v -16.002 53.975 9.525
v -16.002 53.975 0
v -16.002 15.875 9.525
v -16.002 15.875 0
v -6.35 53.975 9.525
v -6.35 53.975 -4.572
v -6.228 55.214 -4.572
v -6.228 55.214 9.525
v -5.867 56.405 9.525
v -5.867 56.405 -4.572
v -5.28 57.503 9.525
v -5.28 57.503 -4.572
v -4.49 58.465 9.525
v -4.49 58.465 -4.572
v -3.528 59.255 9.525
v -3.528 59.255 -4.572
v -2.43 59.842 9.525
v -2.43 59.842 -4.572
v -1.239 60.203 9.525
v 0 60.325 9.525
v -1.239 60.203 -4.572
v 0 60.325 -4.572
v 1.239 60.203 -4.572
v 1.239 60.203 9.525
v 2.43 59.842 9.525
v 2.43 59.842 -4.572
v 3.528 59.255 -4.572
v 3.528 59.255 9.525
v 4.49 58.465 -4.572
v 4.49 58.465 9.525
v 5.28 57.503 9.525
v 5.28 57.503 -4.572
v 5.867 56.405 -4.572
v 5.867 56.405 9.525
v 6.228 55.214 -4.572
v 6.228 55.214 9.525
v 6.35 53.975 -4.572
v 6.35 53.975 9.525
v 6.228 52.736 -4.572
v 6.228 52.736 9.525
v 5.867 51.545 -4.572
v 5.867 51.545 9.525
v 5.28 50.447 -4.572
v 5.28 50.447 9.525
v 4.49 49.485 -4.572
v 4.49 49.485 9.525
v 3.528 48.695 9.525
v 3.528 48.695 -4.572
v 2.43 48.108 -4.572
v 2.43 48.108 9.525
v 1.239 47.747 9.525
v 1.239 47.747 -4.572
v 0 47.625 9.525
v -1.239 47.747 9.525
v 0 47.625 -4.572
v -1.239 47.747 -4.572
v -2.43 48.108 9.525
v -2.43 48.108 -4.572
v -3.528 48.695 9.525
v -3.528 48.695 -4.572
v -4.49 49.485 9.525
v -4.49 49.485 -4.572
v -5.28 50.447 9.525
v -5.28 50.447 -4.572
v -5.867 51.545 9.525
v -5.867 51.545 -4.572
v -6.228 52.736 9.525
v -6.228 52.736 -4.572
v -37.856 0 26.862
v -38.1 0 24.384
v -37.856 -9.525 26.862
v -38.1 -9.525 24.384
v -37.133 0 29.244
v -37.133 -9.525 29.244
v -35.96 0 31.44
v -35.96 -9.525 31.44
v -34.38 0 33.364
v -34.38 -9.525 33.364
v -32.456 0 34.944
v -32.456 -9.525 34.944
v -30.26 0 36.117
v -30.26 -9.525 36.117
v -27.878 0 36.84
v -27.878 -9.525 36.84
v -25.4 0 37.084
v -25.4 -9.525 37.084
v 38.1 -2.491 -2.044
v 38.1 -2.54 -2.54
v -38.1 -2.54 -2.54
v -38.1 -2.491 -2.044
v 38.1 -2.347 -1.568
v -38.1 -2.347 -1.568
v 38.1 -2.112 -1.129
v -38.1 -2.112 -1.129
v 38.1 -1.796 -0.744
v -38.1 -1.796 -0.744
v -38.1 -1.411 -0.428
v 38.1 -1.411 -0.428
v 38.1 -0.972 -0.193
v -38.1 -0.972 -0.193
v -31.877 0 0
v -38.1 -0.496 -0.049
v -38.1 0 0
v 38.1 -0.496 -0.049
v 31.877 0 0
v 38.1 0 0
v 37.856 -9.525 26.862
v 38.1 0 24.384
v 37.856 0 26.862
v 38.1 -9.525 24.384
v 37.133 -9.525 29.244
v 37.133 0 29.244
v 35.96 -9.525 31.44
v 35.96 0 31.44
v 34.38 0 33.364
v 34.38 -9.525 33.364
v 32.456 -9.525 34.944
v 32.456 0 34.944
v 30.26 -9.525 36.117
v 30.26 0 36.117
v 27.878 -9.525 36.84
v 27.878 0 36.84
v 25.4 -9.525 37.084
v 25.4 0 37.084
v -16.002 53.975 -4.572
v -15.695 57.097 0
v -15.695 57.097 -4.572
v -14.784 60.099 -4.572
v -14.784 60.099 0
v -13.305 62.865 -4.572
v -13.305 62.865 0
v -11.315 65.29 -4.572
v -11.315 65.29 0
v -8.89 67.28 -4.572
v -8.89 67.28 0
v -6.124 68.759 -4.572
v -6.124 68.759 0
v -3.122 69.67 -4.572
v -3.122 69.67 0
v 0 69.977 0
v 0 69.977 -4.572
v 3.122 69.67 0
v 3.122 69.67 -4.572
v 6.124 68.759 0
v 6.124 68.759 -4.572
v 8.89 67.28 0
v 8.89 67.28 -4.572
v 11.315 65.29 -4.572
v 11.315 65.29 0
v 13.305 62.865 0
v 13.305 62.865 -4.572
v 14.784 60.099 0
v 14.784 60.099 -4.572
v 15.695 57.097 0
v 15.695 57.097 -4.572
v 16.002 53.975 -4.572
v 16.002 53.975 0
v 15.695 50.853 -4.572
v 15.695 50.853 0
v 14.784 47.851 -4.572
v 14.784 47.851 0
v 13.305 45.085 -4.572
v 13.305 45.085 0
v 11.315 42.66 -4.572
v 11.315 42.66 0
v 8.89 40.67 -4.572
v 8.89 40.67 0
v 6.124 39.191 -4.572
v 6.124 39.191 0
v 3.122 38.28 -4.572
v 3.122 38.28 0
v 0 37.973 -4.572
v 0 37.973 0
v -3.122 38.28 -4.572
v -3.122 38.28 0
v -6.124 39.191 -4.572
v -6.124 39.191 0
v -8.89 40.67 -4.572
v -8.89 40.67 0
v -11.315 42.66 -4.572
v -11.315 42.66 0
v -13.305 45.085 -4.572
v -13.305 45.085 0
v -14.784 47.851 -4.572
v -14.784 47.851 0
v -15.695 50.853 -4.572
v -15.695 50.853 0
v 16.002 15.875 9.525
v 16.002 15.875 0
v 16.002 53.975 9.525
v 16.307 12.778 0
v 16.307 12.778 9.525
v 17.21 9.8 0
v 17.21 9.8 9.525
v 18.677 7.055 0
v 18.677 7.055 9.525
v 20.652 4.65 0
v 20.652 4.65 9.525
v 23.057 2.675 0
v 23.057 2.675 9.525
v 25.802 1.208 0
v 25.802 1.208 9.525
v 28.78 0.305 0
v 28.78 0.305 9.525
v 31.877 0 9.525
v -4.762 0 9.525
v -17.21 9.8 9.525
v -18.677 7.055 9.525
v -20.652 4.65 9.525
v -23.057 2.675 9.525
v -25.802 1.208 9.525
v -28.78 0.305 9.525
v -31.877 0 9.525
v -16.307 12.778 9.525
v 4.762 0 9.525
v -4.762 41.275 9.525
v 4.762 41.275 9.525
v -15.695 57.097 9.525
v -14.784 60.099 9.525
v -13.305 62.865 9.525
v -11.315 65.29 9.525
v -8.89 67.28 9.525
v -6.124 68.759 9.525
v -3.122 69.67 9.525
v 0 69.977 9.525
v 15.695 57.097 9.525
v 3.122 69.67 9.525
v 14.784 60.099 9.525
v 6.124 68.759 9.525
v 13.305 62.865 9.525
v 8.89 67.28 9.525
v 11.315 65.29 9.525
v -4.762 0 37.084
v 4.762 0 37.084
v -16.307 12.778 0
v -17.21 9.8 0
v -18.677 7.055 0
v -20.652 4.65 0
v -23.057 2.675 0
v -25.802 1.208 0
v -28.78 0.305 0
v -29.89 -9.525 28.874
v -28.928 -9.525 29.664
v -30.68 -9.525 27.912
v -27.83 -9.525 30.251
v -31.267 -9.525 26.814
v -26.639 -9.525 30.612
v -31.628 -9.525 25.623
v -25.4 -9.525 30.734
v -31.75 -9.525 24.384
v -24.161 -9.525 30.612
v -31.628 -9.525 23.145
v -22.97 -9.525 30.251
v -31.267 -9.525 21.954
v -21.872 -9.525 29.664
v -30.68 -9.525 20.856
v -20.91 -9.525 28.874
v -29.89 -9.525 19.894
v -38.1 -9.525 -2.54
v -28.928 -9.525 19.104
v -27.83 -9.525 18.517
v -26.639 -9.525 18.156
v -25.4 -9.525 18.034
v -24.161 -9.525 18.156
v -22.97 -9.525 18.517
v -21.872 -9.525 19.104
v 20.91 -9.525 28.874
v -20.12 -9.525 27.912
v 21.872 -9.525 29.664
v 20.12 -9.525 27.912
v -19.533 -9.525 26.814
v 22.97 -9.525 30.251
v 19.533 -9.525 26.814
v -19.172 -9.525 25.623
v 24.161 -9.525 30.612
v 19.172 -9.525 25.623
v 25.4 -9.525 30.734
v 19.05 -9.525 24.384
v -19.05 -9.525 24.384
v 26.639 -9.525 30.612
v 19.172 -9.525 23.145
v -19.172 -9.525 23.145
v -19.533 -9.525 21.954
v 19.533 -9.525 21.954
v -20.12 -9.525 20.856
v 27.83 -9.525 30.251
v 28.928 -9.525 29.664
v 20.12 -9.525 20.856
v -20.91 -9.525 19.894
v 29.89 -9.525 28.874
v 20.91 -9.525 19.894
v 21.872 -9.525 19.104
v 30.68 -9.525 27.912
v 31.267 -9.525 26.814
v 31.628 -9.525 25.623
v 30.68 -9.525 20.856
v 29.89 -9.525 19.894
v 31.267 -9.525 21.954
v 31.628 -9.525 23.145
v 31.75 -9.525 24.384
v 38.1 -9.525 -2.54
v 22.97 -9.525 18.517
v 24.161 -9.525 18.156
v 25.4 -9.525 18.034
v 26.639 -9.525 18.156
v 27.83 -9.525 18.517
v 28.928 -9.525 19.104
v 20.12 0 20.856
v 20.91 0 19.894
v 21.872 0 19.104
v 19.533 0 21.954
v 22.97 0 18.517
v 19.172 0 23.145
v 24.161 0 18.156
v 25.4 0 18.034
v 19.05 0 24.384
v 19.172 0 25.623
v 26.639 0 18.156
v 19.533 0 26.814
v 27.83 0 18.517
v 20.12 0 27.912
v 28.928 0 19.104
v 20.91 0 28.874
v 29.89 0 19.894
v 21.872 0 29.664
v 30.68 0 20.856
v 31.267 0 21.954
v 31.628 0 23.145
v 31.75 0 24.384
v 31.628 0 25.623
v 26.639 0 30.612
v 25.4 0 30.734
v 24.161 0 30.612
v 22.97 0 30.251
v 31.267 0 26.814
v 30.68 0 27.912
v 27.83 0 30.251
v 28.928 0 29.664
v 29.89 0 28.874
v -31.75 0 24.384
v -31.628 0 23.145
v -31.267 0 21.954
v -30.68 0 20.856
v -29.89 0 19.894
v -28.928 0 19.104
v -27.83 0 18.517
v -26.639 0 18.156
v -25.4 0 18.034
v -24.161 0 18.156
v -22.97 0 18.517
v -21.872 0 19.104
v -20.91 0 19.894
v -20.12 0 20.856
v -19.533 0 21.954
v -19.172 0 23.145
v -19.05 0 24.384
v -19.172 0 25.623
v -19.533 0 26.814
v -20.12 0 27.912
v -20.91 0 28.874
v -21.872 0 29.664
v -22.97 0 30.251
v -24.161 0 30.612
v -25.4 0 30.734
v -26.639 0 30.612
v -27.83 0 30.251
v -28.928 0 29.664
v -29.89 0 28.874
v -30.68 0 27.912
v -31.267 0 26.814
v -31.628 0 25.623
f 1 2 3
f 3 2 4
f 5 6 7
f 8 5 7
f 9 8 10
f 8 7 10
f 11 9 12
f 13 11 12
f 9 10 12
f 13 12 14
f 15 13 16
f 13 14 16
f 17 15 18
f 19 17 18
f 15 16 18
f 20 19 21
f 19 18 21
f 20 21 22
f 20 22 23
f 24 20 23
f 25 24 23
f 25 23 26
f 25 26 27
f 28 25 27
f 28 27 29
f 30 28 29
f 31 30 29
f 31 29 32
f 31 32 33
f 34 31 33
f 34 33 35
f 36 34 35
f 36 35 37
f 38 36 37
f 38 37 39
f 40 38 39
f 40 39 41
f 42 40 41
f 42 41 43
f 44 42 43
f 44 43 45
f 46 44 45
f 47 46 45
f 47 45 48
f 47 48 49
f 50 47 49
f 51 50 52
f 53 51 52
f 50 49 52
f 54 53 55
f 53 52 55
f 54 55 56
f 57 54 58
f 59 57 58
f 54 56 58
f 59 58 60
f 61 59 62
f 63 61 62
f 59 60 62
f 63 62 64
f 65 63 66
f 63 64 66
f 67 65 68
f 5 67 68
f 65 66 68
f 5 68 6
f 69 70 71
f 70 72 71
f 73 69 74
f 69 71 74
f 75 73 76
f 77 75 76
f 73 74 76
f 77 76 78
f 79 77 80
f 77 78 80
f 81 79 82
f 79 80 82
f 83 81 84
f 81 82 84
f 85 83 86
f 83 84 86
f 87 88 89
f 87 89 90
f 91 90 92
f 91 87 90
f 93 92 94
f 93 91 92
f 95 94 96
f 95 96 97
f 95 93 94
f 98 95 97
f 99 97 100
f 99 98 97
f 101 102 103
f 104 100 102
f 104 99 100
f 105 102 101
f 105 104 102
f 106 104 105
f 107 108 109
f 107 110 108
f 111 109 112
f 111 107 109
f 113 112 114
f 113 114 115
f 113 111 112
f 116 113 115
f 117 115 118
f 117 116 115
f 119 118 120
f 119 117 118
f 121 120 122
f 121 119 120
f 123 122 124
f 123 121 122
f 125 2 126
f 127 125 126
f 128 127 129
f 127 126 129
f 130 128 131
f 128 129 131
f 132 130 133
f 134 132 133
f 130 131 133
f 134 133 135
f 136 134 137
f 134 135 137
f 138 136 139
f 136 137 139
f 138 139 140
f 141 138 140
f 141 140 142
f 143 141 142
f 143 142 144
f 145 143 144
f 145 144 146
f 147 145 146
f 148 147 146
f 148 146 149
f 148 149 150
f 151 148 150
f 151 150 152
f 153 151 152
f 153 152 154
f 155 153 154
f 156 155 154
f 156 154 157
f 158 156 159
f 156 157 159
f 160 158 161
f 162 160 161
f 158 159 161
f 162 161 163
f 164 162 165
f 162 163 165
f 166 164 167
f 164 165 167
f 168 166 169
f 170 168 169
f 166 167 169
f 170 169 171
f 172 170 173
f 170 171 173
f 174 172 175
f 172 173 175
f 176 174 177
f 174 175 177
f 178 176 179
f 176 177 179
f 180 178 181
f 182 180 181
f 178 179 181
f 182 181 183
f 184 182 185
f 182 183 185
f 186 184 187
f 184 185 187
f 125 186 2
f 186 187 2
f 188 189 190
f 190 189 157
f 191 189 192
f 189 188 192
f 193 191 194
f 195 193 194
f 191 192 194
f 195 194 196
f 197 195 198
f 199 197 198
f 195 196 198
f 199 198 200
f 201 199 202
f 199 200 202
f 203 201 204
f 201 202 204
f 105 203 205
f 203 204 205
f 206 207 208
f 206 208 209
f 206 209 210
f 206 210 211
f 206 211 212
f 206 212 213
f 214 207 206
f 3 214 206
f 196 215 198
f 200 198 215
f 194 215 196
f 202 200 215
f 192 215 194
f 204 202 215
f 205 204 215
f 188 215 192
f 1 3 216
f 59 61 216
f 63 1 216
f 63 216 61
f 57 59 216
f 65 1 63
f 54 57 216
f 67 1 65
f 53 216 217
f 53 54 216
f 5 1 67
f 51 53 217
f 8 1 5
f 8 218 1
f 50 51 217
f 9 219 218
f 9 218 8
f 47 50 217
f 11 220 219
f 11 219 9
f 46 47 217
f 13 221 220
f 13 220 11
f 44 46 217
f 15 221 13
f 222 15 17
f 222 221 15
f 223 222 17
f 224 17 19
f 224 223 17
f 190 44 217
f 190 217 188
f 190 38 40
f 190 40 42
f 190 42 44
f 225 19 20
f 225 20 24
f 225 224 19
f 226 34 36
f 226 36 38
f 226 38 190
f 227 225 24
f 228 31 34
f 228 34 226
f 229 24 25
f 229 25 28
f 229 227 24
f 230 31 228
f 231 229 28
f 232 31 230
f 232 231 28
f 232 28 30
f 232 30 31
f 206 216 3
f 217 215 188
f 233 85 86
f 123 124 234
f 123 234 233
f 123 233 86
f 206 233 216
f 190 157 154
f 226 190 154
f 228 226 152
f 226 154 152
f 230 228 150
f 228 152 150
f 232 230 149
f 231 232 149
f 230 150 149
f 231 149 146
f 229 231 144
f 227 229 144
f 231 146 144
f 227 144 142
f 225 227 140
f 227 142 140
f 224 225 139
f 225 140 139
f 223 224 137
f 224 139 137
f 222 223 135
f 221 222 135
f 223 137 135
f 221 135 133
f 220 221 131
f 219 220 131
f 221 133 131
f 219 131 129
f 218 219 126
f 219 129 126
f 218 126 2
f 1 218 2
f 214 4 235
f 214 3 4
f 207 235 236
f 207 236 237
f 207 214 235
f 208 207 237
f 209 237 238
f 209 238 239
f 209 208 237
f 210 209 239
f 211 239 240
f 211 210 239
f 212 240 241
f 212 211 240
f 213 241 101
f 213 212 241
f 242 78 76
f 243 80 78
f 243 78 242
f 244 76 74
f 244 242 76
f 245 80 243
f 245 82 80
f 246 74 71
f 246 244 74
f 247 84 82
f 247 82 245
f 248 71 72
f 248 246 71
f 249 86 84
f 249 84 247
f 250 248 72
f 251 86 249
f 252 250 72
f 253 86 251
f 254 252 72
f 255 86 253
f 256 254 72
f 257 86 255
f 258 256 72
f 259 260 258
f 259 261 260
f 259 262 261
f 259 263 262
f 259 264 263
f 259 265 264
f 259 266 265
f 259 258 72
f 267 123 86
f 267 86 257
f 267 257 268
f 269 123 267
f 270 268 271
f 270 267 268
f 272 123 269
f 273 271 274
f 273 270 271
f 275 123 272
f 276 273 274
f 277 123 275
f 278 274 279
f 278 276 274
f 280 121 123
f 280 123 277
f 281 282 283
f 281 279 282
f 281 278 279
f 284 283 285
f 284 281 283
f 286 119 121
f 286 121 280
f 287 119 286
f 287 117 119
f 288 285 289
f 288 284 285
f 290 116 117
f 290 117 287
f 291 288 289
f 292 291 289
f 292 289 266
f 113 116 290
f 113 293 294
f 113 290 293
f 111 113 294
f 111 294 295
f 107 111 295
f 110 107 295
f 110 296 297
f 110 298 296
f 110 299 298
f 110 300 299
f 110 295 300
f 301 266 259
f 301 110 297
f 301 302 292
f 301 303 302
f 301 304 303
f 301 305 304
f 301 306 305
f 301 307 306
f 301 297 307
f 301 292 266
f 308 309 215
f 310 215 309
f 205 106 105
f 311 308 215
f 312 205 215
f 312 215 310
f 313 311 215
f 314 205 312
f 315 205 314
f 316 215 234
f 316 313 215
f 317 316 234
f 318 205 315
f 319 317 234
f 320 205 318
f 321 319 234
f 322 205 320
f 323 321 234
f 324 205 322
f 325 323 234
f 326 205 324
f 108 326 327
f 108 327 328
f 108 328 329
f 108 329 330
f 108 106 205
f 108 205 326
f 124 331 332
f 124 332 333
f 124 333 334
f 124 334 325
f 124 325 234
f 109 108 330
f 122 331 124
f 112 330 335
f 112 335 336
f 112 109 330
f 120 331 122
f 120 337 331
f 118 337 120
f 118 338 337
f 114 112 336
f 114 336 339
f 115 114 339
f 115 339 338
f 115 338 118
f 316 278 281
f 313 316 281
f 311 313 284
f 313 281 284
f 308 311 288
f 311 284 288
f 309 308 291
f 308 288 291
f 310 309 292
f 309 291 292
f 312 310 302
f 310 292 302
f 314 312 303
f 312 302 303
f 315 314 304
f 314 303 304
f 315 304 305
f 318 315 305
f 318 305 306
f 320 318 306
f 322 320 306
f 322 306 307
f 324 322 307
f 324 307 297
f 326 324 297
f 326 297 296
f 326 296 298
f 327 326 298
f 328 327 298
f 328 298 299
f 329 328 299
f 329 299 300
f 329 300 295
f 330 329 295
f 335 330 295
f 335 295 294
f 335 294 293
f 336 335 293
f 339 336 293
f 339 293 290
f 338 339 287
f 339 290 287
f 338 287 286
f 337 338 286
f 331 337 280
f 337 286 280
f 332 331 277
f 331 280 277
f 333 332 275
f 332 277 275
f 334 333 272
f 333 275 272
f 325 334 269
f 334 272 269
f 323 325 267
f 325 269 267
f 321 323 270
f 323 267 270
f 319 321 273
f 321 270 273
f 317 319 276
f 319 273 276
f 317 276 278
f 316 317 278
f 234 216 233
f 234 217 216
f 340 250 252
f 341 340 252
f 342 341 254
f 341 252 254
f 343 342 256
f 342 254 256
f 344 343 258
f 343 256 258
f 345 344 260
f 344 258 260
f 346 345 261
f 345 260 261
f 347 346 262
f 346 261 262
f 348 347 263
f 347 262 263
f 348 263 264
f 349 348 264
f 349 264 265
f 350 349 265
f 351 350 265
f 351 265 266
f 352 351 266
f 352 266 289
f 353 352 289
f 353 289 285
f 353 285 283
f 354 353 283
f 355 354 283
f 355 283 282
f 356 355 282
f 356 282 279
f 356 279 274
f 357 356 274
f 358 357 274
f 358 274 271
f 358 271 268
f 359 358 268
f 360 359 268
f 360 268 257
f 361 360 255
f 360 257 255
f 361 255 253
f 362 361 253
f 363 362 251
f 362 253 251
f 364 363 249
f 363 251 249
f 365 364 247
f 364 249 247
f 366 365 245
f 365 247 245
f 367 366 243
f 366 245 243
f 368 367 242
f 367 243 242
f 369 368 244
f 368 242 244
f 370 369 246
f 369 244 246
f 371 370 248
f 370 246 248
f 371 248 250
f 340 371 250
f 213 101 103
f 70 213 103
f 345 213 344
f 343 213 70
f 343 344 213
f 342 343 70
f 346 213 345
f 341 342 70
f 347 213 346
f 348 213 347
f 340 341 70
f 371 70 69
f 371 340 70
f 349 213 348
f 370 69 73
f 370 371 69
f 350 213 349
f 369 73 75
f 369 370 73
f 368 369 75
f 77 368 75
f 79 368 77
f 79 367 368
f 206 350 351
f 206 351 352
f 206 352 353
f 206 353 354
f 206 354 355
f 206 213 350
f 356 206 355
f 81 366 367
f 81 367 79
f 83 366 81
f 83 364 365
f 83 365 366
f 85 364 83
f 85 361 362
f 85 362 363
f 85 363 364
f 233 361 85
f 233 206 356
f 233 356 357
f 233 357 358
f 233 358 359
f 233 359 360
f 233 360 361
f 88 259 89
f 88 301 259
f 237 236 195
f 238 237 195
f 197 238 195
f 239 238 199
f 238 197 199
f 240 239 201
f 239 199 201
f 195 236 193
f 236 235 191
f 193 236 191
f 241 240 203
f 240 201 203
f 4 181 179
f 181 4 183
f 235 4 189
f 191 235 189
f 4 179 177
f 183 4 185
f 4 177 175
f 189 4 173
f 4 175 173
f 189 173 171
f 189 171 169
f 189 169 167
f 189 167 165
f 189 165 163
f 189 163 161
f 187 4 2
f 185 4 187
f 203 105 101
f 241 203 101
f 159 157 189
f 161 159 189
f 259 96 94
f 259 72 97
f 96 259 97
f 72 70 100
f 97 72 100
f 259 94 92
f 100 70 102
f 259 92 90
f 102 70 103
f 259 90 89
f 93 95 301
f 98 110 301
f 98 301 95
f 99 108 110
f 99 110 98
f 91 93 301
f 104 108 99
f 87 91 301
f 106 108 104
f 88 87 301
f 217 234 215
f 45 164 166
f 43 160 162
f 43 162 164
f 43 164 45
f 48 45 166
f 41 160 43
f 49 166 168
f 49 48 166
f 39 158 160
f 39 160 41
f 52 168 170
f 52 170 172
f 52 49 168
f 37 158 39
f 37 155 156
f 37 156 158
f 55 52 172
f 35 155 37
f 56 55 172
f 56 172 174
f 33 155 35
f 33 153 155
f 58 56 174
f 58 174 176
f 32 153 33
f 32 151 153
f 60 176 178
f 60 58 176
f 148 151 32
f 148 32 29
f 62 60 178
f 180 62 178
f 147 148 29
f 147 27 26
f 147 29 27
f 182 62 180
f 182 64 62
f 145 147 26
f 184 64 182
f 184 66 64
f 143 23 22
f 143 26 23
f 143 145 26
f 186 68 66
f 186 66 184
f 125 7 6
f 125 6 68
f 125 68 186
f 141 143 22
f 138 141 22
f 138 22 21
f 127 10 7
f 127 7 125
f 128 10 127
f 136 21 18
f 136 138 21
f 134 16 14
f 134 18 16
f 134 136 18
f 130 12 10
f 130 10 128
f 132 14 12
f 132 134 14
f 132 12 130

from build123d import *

# Parameters (mm, degrees)
BOSS_EXTRUDE1_DEPTH        = 38.1
BOSS_EXTRUDE2_DEPTH        = 9.525
SKETCH3_R                  = 16.002
BOSS_EXTRUDE3_DEPTH        = 4.572
BOSS_EXTRUDE4_DEPTH        = 4.7625
FILLET1_R                  = 15.875
FILLET2_R                  = 12.7
F_1_4_0_5_DIAMETER_HOLE1_D = 12.7
F_1_4_0_5_DIAMETER_HOLE2_D = 12.7


with BuildPart() as part:
    # Sketch1 → Boss-Extrude1 (new body, symmetric)
    with BuildSketch(Plane(origin=(0, 0, 0), x_dir=(0, 0, -1), z_dir=(1, 0, 0))):
        with BuildLine():
            Line((0, 0), (-37.084, 0))
            Line((-37.084, 0), (-37.084, -9.525))
            Line((-37.084, -9.525), (2.54, -9.525))
            Line((2.54, -9.525), (2.54, -2.54))
            ThreePointArc((2.54, -2.54), (0.743948776, -1.796051224), (0, 0))
        make_face()
    extrude(amount=BOSS_EXTRUDE1_DEPTH, both=True)

    # Sketch2 → Boss-Extrude2 (add)
    with BuildSketch(Plane.XY):
        with BuildLine():
            Line((-16.002, 0), (16.002, 0))
            Line((16.002, 0), (16.002, 53.975))
            ThreePointArc((16.002, 53.975), (0, 69.977), (-16.002, 53.975))
            Line((-16.002, 53.975), (-16.002, 0))
        make_face()
    extrude(amount=BOSS_EXTRUDE2_DEPTH)

    # Sketch3 → Boss-Extrude3 (add)
    with BuildSketch(Plane(origin=(0, 0, 0), x_dir=(-1, 0, 0), z_dir=(0, 0, -1))):
        with Locations((0, 53.975)):
            Circle(SKETCH3_R)
    extrude(amount=BOSS_EXTRUDE3_DEPTH)

    # Sketch4 → Boss-Extrude4 (add, symmetric)
    with BuildSketch(Plane(origin=(0, 0, 0), x_dir=(0, 0, -1), z_dir=(1, 0, 0))):
        Polygon((-9.525, 41.275), (-37.084, 0), (-9.525, 0), align=None)
    extrude(amount=BOSS_EXTRUDE4_DEPTH, both=True)

    # Fillet1
    fillet1_edges = [part.edges().sort_by_distance(p)[0] for p in [
        (-16.002, 0, 4.7625),
        (16.002, 0, 4.7625),
    ]]
    fillet(fillet1_edges, radius=FILLET1_R)

    # Fillet2
    fillet2_edges = [part.edges().sort_by_distance(p)[0] for p in [
        (38.1, -4.7625, 37.084),
        (-38.1, -4.7625, 37.084),
    ]]
    fillet(fillet2_edges, radius=FILLET2_R)

    # 1/4 (0.5) Diameter Hole1 (through all)
    with Locations(Plane(origin=(0, 0, 0), x_dir=(1, 0, 0), z_dir=(0, 1, 0))):
        with Locations((-25.4, -24.384), (25.4, -24.384)):
            Hole(F_1_4_0_5_DIAMETER_HOLE1_D / 2)

    # 1/4 (0.5) Diameter Hole2 (through all)
    with Locations(Plane.XY.offset(9.525)):
        with Locations((0, 53.975)):
            Hole(F_1_4_0_5_DIAMETER_HOLE2_D / 2)


solid = part.part
